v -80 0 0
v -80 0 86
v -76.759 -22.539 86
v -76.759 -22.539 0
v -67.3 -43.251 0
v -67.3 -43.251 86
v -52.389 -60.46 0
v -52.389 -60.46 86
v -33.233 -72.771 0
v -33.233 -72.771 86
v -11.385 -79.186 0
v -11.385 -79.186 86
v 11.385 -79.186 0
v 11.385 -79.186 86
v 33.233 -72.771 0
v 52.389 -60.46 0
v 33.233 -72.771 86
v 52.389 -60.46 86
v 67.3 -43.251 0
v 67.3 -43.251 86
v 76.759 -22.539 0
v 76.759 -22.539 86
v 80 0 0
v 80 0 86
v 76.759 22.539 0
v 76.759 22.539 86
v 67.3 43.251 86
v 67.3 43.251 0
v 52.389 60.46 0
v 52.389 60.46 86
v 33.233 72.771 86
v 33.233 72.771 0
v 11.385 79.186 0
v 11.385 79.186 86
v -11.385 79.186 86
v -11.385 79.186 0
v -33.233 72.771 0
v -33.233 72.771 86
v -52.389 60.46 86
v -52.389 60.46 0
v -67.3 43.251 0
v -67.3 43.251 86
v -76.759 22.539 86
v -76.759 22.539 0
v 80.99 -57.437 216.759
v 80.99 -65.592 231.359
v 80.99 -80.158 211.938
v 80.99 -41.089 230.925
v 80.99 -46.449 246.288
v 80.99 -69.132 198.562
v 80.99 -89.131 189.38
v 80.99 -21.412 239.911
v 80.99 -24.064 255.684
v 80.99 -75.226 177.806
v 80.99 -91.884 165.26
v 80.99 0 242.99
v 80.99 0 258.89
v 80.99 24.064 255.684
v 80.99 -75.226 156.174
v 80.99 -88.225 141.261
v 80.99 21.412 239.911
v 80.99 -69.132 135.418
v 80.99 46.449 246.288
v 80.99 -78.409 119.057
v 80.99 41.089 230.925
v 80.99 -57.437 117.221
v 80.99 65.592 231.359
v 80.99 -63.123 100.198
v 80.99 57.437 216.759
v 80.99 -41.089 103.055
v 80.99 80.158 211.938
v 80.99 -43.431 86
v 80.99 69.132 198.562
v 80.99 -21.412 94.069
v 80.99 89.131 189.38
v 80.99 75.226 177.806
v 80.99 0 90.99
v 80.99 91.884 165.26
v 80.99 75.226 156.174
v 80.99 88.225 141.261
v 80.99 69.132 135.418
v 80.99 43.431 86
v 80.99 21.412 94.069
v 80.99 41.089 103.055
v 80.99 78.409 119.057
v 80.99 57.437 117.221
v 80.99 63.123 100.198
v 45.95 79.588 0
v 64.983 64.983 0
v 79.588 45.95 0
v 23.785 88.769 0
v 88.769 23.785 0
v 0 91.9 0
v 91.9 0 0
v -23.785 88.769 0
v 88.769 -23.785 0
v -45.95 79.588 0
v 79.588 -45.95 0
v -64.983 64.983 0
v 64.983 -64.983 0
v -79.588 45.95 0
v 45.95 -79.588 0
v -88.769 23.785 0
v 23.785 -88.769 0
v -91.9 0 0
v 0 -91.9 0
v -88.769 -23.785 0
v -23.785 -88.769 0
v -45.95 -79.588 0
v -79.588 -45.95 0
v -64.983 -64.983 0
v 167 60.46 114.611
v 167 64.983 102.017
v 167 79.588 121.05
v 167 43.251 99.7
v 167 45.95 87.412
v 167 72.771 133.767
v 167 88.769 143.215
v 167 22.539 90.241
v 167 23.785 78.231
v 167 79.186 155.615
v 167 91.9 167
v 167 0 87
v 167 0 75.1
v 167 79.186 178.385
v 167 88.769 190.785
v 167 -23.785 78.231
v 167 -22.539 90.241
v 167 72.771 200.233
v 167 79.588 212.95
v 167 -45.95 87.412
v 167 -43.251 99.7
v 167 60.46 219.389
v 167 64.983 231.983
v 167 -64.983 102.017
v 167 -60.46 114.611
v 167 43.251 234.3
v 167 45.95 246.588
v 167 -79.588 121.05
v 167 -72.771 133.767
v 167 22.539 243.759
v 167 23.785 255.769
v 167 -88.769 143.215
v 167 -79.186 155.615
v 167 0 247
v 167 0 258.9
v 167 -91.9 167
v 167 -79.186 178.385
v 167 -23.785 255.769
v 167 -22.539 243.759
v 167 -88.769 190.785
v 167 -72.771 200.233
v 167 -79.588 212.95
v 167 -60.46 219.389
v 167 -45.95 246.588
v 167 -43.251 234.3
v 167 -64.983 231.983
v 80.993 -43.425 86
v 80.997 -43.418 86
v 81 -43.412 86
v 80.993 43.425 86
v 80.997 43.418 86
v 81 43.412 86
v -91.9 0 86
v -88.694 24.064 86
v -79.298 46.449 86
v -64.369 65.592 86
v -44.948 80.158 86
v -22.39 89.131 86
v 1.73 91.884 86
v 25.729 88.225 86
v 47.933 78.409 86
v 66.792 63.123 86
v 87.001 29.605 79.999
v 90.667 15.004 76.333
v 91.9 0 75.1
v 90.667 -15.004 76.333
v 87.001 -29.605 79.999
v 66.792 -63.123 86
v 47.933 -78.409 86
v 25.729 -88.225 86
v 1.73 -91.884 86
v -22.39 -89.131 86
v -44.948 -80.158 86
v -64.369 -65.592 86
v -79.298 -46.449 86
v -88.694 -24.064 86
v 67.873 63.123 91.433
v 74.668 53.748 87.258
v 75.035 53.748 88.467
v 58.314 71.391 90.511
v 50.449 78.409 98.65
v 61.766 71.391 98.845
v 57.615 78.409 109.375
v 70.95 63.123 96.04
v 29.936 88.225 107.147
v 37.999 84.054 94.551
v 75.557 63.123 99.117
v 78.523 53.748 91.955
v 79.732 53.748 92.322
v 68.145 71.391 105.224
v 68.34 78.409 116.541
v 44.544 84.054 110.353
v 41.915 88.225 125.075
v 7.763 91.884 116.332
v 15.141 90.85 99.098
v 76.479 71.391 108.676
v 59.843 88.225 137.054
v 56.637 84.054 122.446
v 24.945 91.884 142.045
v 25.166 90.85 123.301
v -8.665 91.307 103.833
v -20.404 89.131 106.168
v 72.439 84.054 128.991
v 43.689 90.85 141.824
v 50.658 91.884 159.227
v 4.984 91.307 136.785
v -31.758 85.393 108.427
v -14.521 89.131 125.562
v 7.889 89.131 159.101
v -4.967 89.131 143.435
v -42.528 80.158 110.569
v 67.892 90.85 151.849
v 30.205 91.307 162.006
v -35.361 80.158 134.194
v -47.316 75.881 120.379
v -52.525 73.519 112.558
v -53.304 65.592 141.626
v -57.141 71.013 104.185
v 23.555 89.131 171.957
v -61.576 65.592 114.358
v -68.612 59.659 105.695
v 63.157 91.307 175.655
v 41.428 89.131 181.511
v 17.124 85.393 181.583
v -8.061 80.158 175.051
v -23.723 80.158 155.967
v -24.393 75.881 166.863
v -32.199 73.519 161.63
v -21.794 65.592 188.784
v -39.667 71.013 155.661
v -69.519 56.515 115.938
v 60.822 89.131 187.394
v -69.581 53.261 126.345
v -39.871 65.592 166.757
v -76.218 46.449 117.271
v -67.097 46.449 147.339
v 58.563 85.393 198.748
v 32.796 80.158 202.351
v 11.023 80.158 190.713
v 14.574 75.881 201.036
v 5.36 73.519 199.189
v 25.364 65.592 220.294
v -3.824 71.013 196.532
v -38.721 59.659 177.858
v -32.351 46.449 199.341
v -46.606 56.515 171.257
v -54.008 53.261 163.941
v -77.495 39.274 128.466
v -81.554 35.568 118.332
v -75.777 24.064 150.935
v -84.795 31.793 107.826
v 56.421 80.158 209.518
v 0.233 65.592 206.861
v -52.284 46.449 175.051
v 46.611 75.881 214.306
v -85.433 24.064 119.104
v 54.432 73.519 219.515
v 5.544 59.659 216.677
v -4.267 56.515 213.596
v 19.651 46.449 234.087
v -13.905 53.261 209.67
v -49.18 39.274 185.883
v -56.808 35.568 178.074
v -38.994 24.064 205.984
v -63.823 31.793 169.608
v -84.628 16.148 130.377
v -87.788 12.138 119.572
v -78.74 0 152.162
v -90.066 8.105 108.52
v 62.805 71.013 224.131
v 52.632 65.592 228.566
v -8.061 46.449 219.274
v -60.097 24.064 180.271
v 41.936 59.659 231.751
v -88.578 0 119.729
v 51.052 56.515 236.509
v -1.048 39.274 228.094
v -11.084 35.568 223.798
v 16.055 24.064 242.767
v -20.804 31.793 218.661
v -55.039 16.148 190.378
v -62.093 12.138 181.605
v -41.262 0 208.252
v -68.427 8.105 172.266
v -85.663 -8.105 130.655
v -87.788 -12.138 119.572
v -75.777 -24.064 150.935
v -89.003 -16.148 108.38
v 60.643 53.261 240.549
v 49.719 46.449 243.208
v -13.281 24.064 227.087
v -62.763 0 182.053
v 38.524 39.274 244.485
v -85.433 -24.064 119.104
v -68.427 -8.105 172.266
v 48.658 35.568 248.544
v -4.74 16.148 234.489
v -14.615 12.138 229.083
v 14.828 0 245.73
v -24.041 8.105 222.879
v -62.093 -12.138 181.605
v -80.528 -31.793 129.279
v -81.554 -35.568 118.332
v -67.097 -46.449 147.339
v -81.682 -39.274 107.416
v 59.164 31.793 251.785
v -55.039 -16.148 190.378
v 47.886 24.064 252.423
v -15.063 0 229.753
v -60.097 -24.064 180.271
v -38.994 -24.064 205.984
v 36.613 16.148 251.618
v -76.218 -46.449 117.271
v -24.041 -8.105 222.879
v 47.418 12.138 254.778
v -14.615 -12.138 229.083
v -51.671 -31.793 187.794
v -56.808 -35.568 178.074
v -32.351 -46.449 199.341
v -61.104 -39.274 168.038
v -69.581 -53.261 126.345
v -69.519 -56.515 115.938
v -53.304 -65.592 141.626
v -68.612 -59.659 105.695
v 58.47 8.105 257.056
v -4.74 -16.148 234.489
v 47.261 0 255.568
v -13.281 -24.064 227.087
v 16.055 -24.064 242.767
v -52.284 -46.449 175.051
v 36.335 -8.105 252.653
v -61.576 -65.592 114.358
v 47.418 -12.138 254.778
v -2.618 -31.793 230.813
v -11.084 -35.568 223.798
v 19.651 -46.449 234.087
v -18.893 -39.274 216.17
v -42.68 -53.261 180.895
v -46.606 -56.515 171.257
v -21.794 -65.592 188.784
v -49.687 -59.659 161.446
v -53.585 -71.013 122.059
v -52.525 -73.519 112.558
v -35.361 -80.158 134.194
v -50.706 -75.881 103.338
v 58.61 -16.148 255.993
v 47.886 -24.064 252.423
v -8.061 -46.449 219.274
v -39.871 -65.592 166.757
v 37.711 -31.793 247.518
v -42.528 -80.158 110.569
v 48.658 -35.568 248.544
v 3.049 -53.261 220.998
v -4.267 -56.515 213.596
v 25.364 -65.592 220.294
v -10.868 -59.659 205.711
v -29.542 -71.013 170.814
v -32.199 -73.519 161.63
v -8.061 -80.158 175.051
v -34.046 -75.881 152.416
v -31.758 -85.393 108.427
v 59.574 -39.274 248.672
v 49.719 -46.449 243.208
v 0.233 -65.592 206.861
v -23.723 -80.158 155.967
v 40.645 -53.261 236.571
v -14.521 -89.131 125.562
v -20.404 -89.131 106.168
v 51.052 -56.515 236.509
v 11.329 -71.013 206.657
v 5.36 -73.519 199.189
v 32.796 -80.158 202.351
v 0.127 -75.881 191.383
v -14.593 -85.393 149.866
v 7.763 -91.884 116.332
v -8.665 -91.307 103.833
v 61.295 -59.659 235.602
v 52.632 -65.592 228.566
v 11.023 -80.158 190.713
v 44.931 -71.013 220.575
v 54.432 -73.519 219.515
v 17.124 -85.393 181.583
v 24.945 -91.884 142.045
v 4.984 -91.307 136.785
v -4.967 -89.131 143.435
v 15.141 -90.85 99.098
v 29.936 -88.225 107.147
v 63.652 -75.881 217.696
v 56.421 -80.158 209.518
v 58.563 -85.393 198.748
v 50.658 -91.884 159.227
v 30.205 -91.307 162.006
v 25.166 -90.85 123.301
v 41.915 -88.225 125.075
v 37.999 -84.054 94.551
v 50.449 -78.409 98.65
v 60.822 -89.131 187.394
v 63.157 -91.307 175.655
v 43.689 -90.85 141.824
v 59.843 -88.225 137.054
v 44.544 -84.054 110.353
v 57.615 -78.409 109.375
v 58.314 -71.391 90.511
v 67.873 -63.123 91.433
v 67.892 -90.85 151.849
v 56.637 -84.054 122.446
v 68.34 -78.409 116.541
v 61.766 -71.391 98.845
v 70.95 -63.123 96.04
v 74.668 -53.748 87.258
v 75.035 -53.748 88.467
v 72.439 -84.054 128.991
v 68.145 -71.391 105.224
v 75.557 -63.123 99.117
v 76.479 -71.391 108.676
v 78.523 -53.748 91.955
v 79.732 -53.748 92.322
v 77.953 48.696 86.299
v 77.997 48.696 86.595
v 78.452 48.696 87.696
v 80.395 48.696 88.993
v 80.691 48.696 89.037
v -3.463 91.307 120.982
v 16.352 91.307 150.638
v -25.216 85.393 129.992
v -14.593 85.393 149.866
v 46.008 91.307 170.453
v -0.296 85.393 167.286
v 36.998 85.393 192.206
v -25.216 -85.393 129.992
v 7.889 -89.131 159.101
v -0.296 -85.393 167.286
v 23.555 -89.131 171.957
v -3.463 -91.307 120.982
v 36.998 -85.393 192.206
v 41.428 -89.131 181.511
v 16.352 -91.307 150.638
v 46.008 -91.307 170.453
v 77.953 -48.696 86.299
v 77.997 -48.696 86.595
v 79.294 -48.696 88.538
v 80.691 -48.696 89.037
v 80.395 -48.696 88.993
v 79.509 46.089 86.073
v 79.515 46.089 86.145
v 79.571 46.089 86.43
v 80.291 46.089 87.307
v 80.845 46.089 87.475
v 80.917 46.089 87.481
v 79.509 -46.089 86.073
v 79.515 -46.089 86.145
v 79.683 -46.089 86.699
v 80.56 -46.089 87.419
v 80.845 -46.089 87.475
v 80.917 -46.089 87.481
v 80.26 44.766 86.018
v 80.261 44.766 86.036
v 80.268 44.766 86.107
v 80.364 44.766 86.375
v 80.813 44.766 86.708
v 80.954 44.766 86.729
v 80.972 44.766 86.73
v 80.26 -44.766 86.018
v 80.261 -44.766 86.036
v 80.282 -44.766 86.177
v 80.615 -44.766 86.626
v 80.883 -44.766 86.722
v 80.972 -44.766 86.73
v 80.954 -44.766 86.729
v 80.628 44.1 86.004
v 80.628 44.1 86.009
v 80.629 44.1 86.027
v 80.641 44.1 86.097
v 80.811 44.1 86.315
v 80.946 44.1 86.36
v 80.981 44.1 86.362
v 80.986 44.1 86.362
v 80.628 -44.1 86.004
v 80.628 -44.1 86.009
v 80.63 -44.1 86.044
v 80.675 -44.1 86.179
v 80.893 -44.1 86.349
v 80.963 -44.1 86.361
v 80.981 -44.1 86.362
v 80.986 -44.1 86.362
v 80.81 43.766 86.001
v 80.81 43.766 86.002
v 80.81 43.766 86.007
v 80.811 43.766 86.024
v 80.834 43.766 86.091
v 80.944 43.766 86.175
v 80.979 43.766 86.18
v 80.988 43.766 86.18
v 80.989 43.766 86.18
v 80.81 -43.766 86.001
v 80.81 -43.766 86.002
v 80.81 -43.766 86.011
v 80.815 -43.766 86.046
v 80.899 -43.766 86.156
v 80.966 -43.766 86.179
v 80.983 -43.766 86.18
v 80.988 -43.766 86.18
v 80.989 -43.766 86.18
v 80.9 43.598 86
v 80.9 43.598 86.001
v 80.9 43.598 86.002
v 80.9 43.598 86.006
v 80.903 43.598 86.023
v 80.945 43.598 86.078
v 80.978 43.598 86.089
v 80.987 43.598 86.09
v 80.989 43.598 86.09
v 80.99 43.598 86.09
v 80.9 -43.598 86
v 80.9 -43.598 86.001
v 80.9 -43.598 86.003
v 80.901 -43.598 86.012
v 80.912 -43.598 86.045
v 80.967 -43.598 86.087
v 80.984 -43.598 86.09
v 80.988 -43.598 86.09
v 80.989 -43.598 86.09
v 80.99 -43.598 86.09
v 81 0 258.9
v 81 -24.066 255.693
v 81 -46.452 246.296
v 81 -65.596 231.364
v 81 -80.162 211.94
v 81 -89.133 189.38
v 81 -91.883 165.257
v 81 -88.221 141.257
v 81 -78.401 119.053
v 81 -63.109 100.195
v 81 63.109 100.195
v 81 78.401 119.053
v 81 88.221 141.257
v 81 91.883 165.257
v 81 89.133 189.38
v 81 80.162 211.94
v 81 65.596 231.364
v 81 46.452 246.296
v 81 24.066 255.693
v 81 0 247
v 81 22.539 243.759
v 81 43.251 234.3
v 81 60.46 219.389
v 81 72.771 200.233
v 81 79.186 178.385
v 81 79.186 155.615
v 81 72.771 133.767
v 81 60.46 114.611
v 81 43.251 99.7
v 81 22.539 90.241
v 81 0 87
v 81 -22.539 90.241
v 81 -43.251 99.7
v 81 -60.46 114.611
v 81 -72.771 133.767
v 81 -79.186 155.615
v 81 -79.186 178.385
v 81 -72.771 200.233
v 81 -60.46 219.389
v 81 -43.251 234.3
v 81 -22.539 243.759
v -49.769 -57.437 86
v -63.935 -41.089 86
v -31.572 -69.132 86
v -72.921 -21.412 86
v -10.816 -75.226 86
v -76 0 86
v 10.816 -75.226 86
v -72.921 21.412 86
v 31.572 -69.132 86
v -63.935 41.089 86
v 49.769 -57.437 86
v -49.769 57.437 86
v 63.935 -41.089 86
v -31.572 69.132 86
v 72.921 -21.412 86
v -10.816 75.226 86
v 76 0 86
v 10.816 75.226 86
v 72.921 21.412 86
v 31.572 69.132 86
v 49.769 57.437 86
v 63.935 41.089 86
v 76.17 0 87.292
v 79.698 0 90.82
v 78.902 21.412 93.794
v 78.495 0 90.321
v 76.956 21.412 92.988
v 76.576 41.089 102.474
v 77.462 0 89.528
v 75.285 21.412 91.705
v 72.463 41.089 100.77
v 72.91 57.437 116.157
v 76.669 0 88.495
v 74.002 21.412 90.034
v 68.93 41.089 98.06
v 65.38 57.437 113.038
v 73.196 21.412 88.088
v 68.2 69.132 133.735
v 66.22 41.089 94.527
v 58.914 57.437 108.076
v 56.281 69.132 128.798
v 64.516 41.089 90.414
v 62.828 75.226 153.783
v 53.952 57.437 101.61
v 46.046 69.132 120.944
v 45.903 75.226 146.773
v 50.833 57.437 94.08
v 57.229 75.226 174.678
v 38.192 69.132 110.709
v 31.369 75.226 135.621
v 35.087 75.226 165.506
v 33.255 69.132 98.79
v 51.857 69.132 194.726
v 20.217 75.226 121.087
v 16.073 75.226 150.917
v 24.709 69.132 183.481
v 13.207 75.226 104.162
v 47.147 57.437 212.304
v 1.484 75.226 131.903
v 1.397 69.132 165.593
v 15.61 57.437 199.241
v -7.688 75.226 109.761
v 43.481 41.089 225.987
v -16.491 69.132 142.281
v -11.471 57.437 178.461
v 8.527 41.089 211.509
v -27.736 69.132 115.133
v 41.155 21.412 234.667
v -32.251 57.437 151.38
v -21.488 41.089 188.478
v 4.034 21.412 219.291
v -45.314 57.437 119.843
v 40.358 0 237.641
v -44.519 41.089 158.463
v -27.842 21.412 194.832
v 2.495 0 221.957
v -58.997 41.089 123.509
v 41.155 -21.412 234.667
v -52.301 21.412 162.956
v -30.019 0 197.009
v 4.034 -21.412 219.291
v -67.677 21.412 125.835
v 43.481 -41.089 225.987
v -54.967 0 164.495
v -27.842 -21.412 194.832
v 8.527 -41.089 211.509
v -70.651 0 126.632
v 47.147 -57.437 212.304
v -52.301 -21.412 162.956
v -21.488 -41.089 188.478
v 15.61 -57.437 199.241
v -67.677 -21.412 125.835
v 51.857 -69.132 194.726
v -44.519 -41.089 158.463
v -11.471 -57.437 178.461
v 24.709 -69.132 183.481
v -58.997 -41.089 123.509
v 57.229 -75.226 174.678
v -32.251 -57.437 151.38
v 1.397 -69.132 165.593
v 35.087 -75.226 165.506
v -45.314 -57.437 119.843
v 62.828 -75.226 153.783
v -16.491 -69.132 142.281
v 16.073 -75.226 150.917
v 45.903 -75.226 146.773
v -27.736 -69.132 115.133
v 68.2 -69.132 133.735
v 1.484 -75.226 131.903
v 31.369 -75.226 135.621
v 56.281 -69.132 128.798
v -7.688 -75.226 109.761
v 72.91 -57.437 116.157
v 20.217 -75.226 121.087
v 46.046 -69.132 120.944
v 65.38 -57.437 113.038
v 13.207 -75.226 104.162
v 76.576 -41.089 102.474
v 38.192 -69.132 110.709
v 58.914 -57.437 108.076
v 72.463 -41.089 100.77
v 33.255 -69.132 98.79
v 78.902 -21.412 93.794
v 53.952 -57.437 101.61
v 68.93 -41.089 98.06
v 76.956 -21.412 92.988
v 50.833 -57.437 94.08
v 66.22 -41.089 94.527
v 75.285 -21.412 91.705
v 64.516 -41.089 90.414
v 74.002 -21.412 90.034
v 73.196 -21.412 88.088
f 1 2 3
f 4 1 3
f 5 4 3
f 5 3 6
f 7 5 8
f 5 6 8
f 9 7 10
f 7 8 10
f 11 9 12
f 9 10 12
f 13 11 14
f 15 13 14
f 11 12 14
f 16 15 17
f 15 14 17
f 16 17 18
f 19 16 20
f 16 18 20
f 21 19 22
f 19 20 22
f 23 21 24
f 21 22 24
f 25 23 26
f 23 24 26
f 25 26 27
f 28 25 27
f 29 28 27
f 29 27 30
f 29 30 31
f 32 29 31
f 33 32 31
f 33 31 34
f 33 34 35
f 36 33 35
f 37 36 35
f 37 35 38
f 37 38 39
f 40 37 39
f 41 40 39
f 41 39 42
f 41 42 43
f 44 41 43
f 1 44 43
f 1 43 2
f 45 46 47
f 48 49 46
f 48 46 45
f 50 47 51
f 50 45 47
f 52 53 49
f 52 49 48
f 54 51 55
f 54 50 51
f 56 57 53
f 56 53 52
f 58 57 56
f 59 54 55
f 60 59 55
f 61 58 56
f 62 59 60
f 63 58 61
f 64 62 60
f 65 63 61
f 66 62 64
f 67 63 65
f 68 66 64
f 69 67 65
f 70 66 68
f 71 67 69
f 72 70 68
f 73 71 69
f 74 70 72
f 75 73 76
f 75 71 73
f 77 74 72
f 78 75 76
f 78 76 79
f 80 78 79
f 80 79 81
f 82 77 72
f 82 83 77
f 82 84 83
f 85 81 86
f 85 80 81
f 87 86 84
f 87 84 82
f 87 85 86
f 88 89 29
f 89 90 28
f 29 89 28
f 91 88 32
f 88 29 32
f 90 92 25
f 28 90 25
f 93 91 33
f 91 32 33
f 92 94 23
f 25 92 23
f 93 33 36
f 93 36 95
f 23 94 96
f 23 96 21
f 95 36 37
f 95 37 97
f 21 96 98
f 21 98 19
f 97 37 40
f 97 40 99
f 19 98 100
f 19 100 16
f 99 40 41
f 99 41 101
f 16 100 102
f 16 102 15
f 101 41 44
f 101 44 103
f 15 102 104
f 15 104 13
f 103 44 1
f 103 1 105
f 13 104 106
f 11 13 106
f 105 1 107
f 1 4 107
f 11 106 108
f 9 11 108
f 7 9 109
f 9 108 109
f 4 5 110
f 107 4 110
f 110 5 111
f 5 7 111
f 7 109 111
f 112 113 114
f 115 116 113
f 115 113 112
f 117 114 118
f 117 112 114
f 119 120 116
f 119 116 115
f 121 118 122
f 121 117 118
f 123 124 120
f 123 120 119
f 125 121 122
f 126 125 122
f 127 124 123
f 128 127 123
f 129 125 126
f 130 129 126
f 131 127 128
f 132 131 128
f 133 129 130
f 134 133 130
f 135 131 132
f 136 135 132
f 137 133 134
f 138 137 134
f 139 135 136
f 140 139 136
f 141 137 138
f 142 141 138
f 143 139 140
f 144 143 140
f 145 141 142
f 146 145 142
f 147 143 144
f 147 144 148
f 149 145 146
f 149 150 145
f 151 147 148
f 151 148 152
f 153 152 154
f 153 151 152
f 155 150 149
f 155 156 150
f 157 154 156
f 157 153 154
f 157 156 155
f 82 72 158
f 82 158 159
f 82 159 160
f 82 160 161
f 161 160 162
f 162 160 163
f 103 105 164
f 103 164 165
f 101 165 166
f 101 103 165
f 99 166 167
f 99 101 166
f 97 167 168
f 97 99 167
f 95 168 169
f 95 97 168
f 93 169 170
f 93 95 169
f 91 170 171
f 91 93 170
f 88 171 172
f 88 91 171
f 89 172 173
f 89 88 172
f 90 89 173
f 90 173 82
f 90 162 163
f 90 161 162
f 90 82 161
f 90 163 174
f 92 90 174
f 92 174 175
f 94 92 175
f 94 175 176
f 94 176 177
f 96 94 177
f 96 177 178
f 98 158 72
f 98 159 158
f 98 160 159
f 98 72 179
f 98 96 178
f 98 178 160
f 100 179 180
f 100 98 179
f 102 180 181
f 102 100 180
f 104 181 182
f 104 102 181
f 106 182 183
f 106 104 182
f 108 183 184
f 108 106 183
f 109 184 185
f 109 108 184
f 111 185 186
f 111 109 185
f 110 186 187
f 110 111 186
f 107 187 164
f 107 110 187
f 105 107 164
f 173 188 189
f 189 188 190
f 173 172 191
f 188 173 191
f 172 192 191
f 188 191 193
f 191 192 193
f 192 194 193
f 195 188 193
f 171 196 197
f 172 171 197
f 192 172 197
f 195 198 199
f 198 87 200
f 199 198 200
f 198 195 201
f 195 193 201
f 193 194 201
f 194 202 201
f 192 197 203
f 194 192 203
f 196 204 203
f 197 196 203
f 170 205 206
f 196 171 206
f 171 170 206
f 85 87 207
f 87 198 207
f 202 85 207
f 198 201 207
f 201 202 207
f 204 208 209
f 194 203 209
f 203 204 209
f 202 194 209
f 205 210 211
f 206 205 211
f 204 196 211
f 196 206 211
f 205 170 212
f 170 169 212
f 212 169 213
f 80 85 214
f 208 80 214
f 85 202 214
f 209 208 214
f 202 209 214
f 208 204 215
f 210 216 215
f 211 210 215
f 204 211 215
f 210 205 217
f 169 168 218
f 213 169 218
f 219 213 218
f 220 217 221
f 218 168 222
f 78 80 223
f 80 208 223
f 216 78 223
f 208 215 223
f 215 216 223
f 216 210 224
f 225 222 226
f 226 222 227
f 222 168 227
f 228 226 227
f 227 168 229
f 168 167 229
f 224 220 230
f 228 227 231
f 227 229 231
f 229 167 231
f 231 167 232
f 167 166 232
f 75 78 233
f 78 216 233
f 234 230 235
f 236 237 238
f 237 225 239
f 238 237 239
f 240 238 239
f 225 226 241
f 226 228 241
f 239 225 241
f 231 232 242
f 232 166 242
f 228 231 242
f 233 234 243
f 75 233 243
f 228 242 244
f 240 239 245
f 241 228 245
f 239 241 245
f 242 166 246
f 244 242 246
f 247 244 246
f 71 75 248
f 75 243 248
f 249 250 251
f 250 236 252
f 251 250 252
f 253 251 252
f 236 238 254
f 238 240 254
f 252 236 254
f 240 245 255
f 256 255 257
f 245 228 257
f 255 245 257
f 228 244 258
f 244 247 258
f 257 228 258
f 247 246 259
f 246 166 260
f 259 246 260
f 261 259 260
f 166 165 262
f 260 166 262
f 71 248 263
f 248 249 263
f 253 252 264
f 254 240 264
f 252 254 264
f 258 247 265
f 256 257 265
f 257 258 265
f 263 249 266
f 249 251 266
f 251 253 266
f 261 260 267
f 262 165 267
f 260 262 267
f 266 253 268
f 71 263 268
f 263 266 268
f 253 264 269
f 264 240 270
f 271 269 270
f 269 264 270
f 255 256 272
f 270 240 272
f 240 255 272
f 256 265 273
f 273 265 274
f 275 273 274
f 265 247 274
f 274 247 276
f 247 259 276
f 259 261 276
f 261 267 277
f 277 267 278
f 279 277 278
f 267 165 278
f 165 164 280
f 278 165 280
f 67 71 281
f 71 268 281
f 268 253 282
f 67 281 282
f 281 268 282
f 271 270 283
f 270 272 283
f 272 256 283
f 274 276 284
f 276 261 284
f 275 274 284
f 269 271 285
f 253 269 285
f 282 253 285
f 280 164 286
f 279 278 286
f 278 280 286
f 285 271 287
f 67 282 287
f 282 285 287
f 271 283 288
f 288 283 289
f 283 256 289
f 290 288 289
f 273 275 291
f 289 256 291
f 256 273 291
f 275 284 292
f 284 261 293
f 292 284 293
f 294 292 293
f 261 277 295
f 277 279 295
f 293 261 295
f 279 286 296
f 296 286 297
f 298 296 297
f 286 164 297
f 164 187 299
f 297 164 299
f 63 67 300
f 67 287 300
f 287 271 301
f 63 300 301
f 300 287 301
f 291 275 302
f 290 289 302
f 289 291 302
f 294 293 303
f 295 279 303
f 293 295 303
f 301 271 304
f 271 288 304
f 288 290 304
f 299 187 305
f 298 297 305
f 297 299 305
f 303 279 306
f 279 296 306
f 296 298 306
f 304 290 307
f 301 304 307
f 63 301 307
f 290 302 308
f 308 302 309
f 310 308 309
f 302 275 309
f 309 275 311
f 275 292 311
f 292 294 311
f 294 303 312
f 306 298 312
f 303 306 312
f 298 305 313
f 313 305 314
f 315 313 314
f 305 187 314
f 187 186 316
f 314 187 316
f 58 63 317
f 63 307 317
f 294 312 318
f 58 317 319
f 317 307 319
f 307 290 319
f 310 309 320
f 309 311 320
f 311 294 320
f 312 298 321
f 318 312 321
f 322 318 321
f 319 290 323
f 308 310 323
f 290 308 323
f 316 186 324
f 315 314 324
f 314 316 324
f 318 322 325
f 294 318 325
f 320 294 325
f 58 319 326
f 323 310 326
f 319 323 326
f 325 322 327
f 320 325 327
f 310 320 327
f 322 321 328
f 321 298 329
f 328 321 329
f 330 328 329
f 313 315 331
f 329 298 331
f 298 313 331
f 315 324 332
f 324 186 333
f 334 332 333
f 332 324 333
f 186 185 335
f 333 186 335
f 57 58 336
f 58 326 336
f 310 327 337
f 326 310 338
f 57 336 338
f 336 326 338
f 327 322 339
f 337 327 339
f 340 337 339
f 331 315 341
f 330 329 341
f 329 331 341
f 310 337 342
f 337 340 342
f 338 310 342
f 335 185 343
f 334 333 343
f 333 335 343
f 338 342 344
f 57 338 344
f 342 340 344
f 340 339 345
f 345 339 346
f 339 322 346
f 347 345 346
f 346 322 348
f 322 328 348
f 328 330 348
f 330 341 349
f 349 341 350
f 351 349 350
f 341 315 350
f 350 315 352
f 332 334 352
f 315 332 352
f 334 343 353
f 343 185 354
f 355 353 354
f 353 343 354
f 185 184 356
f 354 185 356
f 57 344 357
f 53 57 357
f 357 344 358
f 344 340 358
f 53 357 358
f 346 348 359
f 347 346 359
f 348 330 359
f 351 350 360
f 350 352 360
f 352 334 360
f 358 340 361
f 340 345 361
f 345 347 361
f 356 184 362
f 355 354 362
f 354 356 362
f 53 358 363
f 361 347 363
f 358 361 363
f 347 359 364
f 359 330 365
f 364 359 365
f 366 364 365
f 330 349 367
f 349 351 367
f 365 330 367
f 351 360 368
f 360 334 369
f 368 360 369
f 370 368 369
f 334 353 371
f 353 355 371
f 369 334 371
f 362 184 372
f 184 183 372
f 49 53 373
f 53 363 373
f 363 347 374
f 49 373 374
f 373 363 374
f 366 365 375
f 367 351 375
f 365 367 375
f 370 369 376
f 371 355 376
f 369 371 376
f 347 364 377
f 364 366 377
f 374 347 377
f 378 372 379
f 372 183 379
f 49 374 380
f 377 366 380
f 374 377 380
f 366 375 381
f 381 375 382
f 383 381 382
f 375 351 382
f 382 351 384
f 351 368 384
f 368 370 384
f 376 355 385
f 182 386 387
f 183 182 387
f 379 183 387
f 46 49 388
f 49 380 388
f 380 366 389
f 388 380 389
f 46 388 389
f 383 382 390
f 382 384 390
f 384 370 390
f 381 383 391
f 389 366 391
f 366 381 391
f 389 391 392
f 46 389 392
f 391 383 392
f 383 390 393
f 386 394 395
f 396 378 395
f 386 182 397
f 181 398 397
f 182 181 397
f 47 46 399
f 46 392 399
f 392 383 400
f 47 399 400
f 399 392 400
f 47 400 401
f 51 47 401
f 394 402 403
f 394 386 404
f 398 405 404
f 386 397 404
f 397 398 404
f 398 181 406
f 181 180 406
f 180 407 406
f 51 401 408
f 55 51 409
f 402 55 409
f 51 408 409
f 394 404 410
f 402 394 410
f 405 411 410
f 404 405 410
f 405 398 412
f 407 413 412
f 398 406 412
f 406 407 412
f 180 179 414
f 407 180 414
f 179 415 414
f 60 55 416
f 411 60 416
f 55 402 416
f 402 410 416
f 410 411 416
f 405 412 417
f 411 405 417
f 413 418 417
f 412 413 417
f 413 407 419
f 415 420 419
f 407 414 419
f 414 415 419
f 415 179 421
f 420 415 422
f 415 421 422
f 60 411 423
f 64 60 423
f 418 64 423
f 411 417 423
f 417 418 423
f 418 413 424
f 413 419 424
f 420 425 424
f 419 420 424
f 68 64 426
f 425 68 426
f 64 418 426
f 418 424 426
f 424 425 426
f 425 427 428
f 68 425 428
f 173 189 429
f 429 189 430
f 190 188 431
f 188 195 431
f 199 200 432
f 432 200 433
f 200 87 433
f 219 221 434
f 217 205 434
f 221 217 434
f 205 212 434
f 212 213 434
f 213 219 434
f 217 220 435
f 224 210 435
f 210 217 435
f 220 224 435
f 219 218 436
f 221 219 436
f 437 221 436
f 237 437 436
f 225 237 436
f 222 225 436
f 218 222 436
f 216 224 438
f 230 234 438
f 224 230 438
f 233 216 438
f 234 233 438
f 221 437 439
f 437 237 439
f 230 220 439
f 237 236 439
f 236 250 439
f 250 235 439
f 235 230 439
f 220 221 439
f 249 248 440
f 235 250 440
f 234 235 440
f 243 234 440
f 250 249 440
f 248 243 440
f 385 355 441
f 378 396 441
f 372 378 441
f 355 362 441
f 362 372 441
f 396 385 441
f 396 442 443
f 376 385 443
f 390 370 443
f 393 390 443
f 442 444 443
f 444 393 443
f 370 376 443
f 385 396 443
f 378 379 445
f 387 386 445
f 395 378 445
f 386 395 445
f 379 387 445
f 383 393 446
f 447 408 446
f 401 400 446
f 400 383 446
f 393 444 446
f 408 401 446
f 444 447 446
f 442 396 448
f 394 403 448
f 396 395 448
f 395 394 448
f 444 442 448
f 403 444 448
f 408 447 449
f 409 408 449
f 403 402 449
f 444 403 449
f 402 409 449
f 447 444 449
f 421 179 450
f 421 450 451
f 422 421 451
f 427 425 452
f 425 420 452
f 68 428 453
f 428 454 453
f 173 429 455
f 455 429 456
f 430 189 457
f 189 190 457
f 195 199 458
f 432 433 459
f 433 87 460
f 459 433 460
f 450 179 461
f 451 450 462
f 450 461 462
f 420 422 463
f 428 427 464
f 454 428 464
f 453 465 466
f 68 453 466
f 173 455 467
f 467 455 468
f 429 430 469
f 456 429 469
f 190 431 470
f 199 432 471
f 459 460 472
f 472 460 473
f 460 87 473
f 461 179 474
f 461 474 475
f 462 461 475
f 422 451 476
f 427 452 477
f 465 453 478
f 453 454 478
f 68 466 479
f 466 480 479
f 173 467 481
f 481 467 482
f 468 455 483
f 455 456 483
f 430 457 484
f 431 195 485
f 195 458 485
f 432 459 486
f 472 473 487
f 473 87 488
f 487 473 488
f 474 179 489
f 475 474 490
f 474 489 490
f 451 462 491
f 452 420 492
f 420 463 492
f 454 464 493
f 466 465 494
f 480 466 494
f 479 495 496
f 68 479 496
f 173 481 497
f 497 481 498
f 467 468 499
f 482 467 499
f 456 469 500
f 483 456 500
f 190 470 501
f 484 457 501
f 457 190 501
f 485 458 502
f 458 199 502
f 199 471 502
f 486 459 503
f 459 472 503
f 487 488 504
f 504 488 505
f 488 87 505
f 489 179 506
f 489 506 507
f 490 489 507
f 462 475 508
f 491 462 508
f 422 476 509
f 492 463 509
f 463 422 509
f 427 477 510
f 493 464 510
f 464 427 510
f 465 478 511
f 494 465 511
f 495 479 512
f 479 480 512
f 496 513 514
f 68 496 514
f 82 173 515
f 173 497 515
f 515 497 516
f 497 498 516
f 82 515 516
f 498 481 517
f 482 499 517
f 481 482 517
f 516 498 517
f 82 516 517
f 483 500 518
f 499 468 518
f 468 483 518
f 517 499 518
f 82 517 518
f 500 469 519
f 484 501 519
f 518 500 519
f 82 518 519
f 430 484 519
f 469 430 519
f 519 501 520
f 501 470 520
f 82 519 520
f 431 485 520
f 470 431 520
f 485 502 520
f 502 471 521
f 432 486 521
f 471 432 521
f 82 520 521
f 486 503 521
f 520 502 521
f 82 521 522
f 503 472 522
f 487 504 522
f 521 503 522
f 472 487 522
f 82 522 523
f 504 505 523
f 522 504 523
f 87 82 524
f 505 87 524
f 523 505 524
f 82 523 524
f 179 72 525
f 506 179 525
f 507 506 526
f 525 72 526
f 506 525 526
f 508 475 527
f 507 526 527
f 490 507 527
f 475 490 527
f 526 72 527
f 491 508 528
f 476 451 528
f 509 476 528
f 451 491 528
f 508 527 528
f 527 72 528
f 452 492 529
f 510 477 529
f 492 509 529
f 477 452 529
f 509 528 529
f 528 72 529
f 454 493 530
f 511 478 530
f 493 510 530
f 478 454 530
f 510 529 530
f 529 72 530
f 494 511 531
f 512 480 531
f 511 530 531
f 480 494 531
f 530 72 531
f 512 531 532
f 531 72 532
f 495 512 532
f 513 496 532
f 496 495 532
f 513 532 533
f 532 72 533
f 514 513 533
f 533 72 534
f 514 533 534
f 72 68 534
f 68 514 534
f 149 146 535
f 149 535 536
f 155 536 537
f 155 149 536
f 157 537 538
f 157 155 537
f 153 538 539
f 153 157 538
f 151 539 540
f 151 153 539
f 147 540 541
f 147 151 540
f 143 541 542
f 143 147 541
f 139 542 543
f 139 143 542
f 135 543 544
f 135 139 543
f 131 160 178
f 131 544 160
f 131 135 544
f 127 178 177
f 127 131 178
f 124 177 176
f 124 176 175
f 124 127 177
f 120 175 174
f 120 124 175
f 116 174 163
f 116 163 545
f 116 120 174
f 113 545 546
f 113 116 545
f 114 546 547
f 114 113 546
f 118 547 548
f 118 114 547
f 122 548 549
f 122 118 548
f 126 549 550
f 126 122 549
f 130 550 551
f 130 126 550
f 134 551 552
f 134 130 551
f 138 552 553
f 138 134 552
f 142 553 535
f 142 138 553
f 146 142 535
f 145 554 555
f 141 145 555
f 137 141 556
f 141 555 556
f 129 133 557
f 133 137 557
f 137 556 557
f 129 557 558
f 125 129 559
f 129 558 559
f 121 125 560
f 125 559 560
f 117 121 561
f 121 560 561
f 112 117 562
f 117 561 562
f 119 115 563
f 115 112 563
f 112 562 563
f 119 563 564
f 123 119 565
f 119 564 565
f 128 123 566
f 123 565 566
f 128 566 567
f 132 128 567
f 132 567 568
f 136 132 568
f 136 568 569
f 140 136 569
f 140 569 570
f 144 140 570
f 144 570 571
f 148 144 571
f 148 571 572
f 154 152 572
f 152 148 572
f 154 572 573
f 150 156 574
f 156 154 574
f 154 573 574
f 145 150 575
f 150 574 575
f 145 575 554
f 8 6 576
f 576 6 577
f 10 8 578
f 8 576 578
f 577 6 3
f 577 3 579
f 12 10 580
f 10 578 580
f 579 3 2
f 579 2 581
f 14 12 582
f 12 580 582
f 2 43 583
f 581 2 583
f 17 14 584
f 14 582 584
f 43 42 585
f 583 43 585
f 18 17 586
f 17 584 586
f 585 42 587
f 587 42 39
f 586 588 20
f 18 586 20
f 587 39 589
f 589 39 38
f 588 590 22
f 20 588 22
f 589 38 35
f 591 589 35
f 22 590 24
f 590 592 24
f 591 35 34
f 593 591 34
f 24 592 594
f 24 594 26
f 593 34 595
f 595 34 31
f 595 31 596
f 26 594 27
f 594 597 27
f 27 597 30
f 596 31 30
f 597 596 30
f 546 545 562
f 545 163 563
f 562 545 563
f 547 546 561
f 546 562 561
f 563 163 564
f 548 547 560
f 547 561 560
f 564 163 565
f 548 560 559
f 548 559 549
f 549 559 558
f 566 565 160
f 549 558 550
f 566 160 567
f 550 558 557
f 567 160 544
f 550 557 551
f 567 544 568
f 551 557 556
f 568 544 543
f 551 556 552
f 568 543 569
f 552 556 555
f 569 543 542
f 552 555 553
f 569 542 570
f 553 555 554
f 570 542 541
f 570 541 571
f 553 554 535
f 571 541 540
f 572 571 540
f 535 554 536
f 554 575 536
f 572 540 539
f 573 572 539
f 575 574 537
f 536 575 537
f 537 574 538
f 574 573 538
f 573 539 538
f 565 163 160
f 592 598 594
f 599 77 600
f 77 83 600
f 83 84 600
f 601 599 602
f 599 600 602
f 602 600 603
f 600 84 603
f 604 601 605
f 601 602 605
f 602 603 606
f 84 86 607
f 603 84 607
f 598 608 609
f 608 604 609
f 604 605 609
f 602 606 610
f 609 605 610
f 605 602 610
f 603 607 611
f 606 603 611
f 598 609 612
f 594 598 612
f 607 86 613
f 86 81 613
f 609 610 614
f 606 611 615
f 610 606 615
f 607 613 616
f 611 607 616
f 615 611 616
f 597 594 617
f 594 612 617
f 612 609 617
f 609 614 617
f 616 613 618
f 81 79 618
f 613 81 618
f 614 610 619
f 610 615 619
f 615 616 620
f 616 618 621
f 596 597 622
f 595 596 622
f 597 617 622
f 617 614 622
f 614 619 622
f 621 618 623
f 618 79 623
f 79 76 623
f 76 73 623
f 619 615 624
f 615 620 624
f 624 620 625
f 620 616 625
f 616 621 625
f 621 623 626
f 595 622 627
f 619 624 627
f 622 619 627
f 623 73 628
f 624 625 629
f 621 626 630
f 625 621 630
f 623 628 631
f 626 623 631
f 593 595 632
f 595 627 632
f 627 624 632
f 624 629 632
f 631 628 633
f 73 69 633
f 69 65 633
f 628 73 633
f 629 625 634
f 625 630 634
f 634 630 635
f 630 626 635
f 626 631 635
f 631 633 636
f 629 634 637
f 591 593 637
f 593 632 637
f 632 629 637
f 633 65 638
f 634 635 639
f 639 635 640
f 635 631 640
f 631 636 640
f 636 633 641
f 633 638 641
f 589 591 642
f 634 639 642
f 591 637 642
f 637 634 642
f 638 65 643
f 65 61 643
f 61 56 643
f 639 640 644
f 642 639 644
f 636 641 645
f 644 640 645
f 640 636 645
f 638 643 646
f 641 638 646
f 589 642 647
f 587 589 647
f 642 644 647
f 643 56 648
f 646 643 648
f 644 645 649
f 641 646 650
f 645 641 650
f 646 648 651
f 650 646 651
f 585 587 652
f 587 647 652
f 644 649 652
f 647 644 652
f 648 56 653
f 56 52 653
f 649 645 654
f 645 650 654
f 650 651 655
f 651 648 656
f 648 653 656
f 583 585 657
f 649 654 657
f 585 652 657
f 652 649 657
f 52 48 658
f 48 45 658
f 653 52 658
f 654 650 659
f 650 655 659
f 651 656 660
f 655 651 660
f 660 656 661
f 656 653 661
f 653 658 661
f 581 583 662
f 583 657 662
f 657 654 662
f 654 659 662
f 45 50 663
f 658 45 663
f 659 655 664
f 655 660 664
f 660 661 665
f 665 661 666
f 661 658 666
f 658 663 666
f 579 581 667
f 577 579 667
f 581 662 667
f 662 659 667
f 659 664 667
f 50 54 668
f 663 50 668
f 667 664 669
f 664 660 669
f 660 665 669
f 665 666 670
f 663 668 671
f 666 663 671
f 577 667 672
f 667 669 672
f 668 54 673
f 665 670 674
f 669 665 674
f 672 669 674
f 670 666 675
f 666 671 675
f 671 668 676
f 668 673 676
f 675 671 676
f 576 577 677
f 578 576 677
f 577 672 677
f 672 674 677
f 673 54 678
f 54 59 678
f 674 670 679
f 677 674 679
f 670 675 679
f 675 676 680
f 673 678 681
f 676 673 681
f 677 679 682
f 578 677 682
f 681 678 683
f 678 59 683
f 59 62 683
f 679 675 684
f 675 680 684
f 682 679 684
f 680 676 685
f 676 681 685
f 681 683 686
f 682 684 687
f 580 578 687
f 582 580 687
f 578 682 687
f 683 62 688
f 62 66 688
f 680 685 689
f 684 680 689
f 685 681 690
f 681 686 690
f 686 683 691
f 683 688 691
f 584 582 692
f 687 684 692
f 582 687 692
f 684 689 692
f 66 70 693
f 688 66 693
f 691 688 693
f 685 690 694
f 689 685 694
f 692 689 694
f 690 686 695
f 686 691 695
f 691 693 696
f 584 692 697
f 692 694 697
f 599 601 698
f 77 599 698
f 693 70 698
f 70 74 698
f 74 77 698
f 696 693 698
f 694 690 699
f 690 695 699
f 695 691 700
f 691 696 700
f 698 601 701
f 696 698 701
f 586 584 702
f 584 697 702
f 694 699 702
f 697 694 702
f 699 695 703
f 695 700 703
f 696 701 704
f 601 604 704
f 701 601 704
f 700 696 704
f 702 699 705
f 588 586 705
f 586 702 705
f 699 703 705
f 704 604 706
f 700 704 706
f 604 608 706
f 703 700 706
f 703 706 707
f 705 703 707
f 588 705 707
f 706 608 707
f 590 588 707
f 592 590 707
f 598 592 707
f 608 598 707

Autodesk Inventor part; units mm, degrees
ref_plane "YZ Plane" through (0, 0, 0) normal (1, 0, 0) x (0, 1, 0)
ref_plane "XZ Plane" through (0, 0, 0) normal (0, 1, 0) x (-1, 0, 0)
ref_plane "XY Plane" through (0, 0, 0) normal (0, 0, 1) x (1, 0, 0)
sketch "Sketch1" plane through (0, 0, 0) normal (0, 1, 0) x (-1, 0, 0)
  line L0 (0, 0) -> (0, 167) construction
  line L1 (0, 167) -> (-167, 167) construction
  line L2 (91.9, 0) -> (80, 0)
  line L3 (80, 0) -> (80, 86)
  line L4 (80, 86) -> (91.9, 86)
  line L5 (91.9, 86) -> (91.9, 0)
  line L6 (0, 0) -> (80, 0) construction
  line L7 (80, 86) -> (0, 86) construction
  line L8 (-167, 167) -> (-167, 247) construction
  line L9 (-167, 247) -> (-81, 247)
  line L10 (-81, 247) -> (-81, 258.9)
  line L11 (-81, 258.9) -> (-167, 258.9)
  line L12 (-167, 258.9) -> (-167, 247)
  line L13 (-81, 247) -> (-81, 167) construction
  dimension "d0" = 86
  dimension "d1" = 81
  dimension "d2" = 160
  dimension "d3" = 11.9
  dimension "d4" = 86
  dimension "d5" = 11.9
  dimension "d6" = 160
  dimension "d7" = 81
revolve "Revolution1" add sketch "Sketch1" angle 360 about axis through (0, 0, 167) along (1, 0, 0) contours L12 L11 L10 L9
revolve "Revolution2" add sketch "Sketch1" angle 360 about axis through (0, 0, 0) along (0, 0, 1) contours L2 L3 L4 L5
sketch "Sketch2" plane through (0, 0, 86) normal (0, 0, 1) x (1, 0, 0)
  line L0 (81, 43.412095) -> (81, -43.412095)
  line L1 (81, -43.412095) -> (81, 43.412095)
  line L2 (81, 80) -> (81, -80)
  line L3 (80.99, -43.430748) -> (80.99, 43.430748)
  arc A0 (81, 43.412095) -> (81, -43.412095) centre (0, 0) ccw
  circle A1 centre (0, 0) radius 91.9
  circle A2 centre (0, 0) radius 76
  dimension "d8" = 0.01
  dimension "d9" = 183.8
  dimension "d10" = 152
sketch "Sketch2 outline for Revolution3" plane through (0, 0, 86) normal (0, 0, 1) x (1, 0, 0)
  arc A0 (80.99, 43.430748) -> (80.99, -43.430748) centre (0, 0) ccw
  line L0 (80.99, -43.430748) -> (80.99, 43.430748)
  circle A1 centre (0, 0) radius 76
revolve "Revolution3" add sketch "Sketch2 outline for Revolution3" angle 90 about axis through (80.99, -43.430748, 86) along (0, 1, 0)
equation "\"d0\" = t1"
equation "\"d1\" = z1"
equation "\"d2\" = dd1"
equation "\"d3\" = s1"
equation "\"d4\" = t1"
equation "\"d5\" = s1"
equation "\"d6\" = dd1"
equation "\"d7\" = z1"
equation "\"d9\" = dd1 + 2 * s1"
equation "\"d10\" = 0.95 * dd1"
equation "\"z1\" = 81"
equation "\"t1\" = 86"
equation "\"s1\" = 11.9"
equation "\"dd1\" = 160"
properties part number "DIN 8063 Колено 90 градусов, тип W1 160" material "ПВХ, непластифицированный"
